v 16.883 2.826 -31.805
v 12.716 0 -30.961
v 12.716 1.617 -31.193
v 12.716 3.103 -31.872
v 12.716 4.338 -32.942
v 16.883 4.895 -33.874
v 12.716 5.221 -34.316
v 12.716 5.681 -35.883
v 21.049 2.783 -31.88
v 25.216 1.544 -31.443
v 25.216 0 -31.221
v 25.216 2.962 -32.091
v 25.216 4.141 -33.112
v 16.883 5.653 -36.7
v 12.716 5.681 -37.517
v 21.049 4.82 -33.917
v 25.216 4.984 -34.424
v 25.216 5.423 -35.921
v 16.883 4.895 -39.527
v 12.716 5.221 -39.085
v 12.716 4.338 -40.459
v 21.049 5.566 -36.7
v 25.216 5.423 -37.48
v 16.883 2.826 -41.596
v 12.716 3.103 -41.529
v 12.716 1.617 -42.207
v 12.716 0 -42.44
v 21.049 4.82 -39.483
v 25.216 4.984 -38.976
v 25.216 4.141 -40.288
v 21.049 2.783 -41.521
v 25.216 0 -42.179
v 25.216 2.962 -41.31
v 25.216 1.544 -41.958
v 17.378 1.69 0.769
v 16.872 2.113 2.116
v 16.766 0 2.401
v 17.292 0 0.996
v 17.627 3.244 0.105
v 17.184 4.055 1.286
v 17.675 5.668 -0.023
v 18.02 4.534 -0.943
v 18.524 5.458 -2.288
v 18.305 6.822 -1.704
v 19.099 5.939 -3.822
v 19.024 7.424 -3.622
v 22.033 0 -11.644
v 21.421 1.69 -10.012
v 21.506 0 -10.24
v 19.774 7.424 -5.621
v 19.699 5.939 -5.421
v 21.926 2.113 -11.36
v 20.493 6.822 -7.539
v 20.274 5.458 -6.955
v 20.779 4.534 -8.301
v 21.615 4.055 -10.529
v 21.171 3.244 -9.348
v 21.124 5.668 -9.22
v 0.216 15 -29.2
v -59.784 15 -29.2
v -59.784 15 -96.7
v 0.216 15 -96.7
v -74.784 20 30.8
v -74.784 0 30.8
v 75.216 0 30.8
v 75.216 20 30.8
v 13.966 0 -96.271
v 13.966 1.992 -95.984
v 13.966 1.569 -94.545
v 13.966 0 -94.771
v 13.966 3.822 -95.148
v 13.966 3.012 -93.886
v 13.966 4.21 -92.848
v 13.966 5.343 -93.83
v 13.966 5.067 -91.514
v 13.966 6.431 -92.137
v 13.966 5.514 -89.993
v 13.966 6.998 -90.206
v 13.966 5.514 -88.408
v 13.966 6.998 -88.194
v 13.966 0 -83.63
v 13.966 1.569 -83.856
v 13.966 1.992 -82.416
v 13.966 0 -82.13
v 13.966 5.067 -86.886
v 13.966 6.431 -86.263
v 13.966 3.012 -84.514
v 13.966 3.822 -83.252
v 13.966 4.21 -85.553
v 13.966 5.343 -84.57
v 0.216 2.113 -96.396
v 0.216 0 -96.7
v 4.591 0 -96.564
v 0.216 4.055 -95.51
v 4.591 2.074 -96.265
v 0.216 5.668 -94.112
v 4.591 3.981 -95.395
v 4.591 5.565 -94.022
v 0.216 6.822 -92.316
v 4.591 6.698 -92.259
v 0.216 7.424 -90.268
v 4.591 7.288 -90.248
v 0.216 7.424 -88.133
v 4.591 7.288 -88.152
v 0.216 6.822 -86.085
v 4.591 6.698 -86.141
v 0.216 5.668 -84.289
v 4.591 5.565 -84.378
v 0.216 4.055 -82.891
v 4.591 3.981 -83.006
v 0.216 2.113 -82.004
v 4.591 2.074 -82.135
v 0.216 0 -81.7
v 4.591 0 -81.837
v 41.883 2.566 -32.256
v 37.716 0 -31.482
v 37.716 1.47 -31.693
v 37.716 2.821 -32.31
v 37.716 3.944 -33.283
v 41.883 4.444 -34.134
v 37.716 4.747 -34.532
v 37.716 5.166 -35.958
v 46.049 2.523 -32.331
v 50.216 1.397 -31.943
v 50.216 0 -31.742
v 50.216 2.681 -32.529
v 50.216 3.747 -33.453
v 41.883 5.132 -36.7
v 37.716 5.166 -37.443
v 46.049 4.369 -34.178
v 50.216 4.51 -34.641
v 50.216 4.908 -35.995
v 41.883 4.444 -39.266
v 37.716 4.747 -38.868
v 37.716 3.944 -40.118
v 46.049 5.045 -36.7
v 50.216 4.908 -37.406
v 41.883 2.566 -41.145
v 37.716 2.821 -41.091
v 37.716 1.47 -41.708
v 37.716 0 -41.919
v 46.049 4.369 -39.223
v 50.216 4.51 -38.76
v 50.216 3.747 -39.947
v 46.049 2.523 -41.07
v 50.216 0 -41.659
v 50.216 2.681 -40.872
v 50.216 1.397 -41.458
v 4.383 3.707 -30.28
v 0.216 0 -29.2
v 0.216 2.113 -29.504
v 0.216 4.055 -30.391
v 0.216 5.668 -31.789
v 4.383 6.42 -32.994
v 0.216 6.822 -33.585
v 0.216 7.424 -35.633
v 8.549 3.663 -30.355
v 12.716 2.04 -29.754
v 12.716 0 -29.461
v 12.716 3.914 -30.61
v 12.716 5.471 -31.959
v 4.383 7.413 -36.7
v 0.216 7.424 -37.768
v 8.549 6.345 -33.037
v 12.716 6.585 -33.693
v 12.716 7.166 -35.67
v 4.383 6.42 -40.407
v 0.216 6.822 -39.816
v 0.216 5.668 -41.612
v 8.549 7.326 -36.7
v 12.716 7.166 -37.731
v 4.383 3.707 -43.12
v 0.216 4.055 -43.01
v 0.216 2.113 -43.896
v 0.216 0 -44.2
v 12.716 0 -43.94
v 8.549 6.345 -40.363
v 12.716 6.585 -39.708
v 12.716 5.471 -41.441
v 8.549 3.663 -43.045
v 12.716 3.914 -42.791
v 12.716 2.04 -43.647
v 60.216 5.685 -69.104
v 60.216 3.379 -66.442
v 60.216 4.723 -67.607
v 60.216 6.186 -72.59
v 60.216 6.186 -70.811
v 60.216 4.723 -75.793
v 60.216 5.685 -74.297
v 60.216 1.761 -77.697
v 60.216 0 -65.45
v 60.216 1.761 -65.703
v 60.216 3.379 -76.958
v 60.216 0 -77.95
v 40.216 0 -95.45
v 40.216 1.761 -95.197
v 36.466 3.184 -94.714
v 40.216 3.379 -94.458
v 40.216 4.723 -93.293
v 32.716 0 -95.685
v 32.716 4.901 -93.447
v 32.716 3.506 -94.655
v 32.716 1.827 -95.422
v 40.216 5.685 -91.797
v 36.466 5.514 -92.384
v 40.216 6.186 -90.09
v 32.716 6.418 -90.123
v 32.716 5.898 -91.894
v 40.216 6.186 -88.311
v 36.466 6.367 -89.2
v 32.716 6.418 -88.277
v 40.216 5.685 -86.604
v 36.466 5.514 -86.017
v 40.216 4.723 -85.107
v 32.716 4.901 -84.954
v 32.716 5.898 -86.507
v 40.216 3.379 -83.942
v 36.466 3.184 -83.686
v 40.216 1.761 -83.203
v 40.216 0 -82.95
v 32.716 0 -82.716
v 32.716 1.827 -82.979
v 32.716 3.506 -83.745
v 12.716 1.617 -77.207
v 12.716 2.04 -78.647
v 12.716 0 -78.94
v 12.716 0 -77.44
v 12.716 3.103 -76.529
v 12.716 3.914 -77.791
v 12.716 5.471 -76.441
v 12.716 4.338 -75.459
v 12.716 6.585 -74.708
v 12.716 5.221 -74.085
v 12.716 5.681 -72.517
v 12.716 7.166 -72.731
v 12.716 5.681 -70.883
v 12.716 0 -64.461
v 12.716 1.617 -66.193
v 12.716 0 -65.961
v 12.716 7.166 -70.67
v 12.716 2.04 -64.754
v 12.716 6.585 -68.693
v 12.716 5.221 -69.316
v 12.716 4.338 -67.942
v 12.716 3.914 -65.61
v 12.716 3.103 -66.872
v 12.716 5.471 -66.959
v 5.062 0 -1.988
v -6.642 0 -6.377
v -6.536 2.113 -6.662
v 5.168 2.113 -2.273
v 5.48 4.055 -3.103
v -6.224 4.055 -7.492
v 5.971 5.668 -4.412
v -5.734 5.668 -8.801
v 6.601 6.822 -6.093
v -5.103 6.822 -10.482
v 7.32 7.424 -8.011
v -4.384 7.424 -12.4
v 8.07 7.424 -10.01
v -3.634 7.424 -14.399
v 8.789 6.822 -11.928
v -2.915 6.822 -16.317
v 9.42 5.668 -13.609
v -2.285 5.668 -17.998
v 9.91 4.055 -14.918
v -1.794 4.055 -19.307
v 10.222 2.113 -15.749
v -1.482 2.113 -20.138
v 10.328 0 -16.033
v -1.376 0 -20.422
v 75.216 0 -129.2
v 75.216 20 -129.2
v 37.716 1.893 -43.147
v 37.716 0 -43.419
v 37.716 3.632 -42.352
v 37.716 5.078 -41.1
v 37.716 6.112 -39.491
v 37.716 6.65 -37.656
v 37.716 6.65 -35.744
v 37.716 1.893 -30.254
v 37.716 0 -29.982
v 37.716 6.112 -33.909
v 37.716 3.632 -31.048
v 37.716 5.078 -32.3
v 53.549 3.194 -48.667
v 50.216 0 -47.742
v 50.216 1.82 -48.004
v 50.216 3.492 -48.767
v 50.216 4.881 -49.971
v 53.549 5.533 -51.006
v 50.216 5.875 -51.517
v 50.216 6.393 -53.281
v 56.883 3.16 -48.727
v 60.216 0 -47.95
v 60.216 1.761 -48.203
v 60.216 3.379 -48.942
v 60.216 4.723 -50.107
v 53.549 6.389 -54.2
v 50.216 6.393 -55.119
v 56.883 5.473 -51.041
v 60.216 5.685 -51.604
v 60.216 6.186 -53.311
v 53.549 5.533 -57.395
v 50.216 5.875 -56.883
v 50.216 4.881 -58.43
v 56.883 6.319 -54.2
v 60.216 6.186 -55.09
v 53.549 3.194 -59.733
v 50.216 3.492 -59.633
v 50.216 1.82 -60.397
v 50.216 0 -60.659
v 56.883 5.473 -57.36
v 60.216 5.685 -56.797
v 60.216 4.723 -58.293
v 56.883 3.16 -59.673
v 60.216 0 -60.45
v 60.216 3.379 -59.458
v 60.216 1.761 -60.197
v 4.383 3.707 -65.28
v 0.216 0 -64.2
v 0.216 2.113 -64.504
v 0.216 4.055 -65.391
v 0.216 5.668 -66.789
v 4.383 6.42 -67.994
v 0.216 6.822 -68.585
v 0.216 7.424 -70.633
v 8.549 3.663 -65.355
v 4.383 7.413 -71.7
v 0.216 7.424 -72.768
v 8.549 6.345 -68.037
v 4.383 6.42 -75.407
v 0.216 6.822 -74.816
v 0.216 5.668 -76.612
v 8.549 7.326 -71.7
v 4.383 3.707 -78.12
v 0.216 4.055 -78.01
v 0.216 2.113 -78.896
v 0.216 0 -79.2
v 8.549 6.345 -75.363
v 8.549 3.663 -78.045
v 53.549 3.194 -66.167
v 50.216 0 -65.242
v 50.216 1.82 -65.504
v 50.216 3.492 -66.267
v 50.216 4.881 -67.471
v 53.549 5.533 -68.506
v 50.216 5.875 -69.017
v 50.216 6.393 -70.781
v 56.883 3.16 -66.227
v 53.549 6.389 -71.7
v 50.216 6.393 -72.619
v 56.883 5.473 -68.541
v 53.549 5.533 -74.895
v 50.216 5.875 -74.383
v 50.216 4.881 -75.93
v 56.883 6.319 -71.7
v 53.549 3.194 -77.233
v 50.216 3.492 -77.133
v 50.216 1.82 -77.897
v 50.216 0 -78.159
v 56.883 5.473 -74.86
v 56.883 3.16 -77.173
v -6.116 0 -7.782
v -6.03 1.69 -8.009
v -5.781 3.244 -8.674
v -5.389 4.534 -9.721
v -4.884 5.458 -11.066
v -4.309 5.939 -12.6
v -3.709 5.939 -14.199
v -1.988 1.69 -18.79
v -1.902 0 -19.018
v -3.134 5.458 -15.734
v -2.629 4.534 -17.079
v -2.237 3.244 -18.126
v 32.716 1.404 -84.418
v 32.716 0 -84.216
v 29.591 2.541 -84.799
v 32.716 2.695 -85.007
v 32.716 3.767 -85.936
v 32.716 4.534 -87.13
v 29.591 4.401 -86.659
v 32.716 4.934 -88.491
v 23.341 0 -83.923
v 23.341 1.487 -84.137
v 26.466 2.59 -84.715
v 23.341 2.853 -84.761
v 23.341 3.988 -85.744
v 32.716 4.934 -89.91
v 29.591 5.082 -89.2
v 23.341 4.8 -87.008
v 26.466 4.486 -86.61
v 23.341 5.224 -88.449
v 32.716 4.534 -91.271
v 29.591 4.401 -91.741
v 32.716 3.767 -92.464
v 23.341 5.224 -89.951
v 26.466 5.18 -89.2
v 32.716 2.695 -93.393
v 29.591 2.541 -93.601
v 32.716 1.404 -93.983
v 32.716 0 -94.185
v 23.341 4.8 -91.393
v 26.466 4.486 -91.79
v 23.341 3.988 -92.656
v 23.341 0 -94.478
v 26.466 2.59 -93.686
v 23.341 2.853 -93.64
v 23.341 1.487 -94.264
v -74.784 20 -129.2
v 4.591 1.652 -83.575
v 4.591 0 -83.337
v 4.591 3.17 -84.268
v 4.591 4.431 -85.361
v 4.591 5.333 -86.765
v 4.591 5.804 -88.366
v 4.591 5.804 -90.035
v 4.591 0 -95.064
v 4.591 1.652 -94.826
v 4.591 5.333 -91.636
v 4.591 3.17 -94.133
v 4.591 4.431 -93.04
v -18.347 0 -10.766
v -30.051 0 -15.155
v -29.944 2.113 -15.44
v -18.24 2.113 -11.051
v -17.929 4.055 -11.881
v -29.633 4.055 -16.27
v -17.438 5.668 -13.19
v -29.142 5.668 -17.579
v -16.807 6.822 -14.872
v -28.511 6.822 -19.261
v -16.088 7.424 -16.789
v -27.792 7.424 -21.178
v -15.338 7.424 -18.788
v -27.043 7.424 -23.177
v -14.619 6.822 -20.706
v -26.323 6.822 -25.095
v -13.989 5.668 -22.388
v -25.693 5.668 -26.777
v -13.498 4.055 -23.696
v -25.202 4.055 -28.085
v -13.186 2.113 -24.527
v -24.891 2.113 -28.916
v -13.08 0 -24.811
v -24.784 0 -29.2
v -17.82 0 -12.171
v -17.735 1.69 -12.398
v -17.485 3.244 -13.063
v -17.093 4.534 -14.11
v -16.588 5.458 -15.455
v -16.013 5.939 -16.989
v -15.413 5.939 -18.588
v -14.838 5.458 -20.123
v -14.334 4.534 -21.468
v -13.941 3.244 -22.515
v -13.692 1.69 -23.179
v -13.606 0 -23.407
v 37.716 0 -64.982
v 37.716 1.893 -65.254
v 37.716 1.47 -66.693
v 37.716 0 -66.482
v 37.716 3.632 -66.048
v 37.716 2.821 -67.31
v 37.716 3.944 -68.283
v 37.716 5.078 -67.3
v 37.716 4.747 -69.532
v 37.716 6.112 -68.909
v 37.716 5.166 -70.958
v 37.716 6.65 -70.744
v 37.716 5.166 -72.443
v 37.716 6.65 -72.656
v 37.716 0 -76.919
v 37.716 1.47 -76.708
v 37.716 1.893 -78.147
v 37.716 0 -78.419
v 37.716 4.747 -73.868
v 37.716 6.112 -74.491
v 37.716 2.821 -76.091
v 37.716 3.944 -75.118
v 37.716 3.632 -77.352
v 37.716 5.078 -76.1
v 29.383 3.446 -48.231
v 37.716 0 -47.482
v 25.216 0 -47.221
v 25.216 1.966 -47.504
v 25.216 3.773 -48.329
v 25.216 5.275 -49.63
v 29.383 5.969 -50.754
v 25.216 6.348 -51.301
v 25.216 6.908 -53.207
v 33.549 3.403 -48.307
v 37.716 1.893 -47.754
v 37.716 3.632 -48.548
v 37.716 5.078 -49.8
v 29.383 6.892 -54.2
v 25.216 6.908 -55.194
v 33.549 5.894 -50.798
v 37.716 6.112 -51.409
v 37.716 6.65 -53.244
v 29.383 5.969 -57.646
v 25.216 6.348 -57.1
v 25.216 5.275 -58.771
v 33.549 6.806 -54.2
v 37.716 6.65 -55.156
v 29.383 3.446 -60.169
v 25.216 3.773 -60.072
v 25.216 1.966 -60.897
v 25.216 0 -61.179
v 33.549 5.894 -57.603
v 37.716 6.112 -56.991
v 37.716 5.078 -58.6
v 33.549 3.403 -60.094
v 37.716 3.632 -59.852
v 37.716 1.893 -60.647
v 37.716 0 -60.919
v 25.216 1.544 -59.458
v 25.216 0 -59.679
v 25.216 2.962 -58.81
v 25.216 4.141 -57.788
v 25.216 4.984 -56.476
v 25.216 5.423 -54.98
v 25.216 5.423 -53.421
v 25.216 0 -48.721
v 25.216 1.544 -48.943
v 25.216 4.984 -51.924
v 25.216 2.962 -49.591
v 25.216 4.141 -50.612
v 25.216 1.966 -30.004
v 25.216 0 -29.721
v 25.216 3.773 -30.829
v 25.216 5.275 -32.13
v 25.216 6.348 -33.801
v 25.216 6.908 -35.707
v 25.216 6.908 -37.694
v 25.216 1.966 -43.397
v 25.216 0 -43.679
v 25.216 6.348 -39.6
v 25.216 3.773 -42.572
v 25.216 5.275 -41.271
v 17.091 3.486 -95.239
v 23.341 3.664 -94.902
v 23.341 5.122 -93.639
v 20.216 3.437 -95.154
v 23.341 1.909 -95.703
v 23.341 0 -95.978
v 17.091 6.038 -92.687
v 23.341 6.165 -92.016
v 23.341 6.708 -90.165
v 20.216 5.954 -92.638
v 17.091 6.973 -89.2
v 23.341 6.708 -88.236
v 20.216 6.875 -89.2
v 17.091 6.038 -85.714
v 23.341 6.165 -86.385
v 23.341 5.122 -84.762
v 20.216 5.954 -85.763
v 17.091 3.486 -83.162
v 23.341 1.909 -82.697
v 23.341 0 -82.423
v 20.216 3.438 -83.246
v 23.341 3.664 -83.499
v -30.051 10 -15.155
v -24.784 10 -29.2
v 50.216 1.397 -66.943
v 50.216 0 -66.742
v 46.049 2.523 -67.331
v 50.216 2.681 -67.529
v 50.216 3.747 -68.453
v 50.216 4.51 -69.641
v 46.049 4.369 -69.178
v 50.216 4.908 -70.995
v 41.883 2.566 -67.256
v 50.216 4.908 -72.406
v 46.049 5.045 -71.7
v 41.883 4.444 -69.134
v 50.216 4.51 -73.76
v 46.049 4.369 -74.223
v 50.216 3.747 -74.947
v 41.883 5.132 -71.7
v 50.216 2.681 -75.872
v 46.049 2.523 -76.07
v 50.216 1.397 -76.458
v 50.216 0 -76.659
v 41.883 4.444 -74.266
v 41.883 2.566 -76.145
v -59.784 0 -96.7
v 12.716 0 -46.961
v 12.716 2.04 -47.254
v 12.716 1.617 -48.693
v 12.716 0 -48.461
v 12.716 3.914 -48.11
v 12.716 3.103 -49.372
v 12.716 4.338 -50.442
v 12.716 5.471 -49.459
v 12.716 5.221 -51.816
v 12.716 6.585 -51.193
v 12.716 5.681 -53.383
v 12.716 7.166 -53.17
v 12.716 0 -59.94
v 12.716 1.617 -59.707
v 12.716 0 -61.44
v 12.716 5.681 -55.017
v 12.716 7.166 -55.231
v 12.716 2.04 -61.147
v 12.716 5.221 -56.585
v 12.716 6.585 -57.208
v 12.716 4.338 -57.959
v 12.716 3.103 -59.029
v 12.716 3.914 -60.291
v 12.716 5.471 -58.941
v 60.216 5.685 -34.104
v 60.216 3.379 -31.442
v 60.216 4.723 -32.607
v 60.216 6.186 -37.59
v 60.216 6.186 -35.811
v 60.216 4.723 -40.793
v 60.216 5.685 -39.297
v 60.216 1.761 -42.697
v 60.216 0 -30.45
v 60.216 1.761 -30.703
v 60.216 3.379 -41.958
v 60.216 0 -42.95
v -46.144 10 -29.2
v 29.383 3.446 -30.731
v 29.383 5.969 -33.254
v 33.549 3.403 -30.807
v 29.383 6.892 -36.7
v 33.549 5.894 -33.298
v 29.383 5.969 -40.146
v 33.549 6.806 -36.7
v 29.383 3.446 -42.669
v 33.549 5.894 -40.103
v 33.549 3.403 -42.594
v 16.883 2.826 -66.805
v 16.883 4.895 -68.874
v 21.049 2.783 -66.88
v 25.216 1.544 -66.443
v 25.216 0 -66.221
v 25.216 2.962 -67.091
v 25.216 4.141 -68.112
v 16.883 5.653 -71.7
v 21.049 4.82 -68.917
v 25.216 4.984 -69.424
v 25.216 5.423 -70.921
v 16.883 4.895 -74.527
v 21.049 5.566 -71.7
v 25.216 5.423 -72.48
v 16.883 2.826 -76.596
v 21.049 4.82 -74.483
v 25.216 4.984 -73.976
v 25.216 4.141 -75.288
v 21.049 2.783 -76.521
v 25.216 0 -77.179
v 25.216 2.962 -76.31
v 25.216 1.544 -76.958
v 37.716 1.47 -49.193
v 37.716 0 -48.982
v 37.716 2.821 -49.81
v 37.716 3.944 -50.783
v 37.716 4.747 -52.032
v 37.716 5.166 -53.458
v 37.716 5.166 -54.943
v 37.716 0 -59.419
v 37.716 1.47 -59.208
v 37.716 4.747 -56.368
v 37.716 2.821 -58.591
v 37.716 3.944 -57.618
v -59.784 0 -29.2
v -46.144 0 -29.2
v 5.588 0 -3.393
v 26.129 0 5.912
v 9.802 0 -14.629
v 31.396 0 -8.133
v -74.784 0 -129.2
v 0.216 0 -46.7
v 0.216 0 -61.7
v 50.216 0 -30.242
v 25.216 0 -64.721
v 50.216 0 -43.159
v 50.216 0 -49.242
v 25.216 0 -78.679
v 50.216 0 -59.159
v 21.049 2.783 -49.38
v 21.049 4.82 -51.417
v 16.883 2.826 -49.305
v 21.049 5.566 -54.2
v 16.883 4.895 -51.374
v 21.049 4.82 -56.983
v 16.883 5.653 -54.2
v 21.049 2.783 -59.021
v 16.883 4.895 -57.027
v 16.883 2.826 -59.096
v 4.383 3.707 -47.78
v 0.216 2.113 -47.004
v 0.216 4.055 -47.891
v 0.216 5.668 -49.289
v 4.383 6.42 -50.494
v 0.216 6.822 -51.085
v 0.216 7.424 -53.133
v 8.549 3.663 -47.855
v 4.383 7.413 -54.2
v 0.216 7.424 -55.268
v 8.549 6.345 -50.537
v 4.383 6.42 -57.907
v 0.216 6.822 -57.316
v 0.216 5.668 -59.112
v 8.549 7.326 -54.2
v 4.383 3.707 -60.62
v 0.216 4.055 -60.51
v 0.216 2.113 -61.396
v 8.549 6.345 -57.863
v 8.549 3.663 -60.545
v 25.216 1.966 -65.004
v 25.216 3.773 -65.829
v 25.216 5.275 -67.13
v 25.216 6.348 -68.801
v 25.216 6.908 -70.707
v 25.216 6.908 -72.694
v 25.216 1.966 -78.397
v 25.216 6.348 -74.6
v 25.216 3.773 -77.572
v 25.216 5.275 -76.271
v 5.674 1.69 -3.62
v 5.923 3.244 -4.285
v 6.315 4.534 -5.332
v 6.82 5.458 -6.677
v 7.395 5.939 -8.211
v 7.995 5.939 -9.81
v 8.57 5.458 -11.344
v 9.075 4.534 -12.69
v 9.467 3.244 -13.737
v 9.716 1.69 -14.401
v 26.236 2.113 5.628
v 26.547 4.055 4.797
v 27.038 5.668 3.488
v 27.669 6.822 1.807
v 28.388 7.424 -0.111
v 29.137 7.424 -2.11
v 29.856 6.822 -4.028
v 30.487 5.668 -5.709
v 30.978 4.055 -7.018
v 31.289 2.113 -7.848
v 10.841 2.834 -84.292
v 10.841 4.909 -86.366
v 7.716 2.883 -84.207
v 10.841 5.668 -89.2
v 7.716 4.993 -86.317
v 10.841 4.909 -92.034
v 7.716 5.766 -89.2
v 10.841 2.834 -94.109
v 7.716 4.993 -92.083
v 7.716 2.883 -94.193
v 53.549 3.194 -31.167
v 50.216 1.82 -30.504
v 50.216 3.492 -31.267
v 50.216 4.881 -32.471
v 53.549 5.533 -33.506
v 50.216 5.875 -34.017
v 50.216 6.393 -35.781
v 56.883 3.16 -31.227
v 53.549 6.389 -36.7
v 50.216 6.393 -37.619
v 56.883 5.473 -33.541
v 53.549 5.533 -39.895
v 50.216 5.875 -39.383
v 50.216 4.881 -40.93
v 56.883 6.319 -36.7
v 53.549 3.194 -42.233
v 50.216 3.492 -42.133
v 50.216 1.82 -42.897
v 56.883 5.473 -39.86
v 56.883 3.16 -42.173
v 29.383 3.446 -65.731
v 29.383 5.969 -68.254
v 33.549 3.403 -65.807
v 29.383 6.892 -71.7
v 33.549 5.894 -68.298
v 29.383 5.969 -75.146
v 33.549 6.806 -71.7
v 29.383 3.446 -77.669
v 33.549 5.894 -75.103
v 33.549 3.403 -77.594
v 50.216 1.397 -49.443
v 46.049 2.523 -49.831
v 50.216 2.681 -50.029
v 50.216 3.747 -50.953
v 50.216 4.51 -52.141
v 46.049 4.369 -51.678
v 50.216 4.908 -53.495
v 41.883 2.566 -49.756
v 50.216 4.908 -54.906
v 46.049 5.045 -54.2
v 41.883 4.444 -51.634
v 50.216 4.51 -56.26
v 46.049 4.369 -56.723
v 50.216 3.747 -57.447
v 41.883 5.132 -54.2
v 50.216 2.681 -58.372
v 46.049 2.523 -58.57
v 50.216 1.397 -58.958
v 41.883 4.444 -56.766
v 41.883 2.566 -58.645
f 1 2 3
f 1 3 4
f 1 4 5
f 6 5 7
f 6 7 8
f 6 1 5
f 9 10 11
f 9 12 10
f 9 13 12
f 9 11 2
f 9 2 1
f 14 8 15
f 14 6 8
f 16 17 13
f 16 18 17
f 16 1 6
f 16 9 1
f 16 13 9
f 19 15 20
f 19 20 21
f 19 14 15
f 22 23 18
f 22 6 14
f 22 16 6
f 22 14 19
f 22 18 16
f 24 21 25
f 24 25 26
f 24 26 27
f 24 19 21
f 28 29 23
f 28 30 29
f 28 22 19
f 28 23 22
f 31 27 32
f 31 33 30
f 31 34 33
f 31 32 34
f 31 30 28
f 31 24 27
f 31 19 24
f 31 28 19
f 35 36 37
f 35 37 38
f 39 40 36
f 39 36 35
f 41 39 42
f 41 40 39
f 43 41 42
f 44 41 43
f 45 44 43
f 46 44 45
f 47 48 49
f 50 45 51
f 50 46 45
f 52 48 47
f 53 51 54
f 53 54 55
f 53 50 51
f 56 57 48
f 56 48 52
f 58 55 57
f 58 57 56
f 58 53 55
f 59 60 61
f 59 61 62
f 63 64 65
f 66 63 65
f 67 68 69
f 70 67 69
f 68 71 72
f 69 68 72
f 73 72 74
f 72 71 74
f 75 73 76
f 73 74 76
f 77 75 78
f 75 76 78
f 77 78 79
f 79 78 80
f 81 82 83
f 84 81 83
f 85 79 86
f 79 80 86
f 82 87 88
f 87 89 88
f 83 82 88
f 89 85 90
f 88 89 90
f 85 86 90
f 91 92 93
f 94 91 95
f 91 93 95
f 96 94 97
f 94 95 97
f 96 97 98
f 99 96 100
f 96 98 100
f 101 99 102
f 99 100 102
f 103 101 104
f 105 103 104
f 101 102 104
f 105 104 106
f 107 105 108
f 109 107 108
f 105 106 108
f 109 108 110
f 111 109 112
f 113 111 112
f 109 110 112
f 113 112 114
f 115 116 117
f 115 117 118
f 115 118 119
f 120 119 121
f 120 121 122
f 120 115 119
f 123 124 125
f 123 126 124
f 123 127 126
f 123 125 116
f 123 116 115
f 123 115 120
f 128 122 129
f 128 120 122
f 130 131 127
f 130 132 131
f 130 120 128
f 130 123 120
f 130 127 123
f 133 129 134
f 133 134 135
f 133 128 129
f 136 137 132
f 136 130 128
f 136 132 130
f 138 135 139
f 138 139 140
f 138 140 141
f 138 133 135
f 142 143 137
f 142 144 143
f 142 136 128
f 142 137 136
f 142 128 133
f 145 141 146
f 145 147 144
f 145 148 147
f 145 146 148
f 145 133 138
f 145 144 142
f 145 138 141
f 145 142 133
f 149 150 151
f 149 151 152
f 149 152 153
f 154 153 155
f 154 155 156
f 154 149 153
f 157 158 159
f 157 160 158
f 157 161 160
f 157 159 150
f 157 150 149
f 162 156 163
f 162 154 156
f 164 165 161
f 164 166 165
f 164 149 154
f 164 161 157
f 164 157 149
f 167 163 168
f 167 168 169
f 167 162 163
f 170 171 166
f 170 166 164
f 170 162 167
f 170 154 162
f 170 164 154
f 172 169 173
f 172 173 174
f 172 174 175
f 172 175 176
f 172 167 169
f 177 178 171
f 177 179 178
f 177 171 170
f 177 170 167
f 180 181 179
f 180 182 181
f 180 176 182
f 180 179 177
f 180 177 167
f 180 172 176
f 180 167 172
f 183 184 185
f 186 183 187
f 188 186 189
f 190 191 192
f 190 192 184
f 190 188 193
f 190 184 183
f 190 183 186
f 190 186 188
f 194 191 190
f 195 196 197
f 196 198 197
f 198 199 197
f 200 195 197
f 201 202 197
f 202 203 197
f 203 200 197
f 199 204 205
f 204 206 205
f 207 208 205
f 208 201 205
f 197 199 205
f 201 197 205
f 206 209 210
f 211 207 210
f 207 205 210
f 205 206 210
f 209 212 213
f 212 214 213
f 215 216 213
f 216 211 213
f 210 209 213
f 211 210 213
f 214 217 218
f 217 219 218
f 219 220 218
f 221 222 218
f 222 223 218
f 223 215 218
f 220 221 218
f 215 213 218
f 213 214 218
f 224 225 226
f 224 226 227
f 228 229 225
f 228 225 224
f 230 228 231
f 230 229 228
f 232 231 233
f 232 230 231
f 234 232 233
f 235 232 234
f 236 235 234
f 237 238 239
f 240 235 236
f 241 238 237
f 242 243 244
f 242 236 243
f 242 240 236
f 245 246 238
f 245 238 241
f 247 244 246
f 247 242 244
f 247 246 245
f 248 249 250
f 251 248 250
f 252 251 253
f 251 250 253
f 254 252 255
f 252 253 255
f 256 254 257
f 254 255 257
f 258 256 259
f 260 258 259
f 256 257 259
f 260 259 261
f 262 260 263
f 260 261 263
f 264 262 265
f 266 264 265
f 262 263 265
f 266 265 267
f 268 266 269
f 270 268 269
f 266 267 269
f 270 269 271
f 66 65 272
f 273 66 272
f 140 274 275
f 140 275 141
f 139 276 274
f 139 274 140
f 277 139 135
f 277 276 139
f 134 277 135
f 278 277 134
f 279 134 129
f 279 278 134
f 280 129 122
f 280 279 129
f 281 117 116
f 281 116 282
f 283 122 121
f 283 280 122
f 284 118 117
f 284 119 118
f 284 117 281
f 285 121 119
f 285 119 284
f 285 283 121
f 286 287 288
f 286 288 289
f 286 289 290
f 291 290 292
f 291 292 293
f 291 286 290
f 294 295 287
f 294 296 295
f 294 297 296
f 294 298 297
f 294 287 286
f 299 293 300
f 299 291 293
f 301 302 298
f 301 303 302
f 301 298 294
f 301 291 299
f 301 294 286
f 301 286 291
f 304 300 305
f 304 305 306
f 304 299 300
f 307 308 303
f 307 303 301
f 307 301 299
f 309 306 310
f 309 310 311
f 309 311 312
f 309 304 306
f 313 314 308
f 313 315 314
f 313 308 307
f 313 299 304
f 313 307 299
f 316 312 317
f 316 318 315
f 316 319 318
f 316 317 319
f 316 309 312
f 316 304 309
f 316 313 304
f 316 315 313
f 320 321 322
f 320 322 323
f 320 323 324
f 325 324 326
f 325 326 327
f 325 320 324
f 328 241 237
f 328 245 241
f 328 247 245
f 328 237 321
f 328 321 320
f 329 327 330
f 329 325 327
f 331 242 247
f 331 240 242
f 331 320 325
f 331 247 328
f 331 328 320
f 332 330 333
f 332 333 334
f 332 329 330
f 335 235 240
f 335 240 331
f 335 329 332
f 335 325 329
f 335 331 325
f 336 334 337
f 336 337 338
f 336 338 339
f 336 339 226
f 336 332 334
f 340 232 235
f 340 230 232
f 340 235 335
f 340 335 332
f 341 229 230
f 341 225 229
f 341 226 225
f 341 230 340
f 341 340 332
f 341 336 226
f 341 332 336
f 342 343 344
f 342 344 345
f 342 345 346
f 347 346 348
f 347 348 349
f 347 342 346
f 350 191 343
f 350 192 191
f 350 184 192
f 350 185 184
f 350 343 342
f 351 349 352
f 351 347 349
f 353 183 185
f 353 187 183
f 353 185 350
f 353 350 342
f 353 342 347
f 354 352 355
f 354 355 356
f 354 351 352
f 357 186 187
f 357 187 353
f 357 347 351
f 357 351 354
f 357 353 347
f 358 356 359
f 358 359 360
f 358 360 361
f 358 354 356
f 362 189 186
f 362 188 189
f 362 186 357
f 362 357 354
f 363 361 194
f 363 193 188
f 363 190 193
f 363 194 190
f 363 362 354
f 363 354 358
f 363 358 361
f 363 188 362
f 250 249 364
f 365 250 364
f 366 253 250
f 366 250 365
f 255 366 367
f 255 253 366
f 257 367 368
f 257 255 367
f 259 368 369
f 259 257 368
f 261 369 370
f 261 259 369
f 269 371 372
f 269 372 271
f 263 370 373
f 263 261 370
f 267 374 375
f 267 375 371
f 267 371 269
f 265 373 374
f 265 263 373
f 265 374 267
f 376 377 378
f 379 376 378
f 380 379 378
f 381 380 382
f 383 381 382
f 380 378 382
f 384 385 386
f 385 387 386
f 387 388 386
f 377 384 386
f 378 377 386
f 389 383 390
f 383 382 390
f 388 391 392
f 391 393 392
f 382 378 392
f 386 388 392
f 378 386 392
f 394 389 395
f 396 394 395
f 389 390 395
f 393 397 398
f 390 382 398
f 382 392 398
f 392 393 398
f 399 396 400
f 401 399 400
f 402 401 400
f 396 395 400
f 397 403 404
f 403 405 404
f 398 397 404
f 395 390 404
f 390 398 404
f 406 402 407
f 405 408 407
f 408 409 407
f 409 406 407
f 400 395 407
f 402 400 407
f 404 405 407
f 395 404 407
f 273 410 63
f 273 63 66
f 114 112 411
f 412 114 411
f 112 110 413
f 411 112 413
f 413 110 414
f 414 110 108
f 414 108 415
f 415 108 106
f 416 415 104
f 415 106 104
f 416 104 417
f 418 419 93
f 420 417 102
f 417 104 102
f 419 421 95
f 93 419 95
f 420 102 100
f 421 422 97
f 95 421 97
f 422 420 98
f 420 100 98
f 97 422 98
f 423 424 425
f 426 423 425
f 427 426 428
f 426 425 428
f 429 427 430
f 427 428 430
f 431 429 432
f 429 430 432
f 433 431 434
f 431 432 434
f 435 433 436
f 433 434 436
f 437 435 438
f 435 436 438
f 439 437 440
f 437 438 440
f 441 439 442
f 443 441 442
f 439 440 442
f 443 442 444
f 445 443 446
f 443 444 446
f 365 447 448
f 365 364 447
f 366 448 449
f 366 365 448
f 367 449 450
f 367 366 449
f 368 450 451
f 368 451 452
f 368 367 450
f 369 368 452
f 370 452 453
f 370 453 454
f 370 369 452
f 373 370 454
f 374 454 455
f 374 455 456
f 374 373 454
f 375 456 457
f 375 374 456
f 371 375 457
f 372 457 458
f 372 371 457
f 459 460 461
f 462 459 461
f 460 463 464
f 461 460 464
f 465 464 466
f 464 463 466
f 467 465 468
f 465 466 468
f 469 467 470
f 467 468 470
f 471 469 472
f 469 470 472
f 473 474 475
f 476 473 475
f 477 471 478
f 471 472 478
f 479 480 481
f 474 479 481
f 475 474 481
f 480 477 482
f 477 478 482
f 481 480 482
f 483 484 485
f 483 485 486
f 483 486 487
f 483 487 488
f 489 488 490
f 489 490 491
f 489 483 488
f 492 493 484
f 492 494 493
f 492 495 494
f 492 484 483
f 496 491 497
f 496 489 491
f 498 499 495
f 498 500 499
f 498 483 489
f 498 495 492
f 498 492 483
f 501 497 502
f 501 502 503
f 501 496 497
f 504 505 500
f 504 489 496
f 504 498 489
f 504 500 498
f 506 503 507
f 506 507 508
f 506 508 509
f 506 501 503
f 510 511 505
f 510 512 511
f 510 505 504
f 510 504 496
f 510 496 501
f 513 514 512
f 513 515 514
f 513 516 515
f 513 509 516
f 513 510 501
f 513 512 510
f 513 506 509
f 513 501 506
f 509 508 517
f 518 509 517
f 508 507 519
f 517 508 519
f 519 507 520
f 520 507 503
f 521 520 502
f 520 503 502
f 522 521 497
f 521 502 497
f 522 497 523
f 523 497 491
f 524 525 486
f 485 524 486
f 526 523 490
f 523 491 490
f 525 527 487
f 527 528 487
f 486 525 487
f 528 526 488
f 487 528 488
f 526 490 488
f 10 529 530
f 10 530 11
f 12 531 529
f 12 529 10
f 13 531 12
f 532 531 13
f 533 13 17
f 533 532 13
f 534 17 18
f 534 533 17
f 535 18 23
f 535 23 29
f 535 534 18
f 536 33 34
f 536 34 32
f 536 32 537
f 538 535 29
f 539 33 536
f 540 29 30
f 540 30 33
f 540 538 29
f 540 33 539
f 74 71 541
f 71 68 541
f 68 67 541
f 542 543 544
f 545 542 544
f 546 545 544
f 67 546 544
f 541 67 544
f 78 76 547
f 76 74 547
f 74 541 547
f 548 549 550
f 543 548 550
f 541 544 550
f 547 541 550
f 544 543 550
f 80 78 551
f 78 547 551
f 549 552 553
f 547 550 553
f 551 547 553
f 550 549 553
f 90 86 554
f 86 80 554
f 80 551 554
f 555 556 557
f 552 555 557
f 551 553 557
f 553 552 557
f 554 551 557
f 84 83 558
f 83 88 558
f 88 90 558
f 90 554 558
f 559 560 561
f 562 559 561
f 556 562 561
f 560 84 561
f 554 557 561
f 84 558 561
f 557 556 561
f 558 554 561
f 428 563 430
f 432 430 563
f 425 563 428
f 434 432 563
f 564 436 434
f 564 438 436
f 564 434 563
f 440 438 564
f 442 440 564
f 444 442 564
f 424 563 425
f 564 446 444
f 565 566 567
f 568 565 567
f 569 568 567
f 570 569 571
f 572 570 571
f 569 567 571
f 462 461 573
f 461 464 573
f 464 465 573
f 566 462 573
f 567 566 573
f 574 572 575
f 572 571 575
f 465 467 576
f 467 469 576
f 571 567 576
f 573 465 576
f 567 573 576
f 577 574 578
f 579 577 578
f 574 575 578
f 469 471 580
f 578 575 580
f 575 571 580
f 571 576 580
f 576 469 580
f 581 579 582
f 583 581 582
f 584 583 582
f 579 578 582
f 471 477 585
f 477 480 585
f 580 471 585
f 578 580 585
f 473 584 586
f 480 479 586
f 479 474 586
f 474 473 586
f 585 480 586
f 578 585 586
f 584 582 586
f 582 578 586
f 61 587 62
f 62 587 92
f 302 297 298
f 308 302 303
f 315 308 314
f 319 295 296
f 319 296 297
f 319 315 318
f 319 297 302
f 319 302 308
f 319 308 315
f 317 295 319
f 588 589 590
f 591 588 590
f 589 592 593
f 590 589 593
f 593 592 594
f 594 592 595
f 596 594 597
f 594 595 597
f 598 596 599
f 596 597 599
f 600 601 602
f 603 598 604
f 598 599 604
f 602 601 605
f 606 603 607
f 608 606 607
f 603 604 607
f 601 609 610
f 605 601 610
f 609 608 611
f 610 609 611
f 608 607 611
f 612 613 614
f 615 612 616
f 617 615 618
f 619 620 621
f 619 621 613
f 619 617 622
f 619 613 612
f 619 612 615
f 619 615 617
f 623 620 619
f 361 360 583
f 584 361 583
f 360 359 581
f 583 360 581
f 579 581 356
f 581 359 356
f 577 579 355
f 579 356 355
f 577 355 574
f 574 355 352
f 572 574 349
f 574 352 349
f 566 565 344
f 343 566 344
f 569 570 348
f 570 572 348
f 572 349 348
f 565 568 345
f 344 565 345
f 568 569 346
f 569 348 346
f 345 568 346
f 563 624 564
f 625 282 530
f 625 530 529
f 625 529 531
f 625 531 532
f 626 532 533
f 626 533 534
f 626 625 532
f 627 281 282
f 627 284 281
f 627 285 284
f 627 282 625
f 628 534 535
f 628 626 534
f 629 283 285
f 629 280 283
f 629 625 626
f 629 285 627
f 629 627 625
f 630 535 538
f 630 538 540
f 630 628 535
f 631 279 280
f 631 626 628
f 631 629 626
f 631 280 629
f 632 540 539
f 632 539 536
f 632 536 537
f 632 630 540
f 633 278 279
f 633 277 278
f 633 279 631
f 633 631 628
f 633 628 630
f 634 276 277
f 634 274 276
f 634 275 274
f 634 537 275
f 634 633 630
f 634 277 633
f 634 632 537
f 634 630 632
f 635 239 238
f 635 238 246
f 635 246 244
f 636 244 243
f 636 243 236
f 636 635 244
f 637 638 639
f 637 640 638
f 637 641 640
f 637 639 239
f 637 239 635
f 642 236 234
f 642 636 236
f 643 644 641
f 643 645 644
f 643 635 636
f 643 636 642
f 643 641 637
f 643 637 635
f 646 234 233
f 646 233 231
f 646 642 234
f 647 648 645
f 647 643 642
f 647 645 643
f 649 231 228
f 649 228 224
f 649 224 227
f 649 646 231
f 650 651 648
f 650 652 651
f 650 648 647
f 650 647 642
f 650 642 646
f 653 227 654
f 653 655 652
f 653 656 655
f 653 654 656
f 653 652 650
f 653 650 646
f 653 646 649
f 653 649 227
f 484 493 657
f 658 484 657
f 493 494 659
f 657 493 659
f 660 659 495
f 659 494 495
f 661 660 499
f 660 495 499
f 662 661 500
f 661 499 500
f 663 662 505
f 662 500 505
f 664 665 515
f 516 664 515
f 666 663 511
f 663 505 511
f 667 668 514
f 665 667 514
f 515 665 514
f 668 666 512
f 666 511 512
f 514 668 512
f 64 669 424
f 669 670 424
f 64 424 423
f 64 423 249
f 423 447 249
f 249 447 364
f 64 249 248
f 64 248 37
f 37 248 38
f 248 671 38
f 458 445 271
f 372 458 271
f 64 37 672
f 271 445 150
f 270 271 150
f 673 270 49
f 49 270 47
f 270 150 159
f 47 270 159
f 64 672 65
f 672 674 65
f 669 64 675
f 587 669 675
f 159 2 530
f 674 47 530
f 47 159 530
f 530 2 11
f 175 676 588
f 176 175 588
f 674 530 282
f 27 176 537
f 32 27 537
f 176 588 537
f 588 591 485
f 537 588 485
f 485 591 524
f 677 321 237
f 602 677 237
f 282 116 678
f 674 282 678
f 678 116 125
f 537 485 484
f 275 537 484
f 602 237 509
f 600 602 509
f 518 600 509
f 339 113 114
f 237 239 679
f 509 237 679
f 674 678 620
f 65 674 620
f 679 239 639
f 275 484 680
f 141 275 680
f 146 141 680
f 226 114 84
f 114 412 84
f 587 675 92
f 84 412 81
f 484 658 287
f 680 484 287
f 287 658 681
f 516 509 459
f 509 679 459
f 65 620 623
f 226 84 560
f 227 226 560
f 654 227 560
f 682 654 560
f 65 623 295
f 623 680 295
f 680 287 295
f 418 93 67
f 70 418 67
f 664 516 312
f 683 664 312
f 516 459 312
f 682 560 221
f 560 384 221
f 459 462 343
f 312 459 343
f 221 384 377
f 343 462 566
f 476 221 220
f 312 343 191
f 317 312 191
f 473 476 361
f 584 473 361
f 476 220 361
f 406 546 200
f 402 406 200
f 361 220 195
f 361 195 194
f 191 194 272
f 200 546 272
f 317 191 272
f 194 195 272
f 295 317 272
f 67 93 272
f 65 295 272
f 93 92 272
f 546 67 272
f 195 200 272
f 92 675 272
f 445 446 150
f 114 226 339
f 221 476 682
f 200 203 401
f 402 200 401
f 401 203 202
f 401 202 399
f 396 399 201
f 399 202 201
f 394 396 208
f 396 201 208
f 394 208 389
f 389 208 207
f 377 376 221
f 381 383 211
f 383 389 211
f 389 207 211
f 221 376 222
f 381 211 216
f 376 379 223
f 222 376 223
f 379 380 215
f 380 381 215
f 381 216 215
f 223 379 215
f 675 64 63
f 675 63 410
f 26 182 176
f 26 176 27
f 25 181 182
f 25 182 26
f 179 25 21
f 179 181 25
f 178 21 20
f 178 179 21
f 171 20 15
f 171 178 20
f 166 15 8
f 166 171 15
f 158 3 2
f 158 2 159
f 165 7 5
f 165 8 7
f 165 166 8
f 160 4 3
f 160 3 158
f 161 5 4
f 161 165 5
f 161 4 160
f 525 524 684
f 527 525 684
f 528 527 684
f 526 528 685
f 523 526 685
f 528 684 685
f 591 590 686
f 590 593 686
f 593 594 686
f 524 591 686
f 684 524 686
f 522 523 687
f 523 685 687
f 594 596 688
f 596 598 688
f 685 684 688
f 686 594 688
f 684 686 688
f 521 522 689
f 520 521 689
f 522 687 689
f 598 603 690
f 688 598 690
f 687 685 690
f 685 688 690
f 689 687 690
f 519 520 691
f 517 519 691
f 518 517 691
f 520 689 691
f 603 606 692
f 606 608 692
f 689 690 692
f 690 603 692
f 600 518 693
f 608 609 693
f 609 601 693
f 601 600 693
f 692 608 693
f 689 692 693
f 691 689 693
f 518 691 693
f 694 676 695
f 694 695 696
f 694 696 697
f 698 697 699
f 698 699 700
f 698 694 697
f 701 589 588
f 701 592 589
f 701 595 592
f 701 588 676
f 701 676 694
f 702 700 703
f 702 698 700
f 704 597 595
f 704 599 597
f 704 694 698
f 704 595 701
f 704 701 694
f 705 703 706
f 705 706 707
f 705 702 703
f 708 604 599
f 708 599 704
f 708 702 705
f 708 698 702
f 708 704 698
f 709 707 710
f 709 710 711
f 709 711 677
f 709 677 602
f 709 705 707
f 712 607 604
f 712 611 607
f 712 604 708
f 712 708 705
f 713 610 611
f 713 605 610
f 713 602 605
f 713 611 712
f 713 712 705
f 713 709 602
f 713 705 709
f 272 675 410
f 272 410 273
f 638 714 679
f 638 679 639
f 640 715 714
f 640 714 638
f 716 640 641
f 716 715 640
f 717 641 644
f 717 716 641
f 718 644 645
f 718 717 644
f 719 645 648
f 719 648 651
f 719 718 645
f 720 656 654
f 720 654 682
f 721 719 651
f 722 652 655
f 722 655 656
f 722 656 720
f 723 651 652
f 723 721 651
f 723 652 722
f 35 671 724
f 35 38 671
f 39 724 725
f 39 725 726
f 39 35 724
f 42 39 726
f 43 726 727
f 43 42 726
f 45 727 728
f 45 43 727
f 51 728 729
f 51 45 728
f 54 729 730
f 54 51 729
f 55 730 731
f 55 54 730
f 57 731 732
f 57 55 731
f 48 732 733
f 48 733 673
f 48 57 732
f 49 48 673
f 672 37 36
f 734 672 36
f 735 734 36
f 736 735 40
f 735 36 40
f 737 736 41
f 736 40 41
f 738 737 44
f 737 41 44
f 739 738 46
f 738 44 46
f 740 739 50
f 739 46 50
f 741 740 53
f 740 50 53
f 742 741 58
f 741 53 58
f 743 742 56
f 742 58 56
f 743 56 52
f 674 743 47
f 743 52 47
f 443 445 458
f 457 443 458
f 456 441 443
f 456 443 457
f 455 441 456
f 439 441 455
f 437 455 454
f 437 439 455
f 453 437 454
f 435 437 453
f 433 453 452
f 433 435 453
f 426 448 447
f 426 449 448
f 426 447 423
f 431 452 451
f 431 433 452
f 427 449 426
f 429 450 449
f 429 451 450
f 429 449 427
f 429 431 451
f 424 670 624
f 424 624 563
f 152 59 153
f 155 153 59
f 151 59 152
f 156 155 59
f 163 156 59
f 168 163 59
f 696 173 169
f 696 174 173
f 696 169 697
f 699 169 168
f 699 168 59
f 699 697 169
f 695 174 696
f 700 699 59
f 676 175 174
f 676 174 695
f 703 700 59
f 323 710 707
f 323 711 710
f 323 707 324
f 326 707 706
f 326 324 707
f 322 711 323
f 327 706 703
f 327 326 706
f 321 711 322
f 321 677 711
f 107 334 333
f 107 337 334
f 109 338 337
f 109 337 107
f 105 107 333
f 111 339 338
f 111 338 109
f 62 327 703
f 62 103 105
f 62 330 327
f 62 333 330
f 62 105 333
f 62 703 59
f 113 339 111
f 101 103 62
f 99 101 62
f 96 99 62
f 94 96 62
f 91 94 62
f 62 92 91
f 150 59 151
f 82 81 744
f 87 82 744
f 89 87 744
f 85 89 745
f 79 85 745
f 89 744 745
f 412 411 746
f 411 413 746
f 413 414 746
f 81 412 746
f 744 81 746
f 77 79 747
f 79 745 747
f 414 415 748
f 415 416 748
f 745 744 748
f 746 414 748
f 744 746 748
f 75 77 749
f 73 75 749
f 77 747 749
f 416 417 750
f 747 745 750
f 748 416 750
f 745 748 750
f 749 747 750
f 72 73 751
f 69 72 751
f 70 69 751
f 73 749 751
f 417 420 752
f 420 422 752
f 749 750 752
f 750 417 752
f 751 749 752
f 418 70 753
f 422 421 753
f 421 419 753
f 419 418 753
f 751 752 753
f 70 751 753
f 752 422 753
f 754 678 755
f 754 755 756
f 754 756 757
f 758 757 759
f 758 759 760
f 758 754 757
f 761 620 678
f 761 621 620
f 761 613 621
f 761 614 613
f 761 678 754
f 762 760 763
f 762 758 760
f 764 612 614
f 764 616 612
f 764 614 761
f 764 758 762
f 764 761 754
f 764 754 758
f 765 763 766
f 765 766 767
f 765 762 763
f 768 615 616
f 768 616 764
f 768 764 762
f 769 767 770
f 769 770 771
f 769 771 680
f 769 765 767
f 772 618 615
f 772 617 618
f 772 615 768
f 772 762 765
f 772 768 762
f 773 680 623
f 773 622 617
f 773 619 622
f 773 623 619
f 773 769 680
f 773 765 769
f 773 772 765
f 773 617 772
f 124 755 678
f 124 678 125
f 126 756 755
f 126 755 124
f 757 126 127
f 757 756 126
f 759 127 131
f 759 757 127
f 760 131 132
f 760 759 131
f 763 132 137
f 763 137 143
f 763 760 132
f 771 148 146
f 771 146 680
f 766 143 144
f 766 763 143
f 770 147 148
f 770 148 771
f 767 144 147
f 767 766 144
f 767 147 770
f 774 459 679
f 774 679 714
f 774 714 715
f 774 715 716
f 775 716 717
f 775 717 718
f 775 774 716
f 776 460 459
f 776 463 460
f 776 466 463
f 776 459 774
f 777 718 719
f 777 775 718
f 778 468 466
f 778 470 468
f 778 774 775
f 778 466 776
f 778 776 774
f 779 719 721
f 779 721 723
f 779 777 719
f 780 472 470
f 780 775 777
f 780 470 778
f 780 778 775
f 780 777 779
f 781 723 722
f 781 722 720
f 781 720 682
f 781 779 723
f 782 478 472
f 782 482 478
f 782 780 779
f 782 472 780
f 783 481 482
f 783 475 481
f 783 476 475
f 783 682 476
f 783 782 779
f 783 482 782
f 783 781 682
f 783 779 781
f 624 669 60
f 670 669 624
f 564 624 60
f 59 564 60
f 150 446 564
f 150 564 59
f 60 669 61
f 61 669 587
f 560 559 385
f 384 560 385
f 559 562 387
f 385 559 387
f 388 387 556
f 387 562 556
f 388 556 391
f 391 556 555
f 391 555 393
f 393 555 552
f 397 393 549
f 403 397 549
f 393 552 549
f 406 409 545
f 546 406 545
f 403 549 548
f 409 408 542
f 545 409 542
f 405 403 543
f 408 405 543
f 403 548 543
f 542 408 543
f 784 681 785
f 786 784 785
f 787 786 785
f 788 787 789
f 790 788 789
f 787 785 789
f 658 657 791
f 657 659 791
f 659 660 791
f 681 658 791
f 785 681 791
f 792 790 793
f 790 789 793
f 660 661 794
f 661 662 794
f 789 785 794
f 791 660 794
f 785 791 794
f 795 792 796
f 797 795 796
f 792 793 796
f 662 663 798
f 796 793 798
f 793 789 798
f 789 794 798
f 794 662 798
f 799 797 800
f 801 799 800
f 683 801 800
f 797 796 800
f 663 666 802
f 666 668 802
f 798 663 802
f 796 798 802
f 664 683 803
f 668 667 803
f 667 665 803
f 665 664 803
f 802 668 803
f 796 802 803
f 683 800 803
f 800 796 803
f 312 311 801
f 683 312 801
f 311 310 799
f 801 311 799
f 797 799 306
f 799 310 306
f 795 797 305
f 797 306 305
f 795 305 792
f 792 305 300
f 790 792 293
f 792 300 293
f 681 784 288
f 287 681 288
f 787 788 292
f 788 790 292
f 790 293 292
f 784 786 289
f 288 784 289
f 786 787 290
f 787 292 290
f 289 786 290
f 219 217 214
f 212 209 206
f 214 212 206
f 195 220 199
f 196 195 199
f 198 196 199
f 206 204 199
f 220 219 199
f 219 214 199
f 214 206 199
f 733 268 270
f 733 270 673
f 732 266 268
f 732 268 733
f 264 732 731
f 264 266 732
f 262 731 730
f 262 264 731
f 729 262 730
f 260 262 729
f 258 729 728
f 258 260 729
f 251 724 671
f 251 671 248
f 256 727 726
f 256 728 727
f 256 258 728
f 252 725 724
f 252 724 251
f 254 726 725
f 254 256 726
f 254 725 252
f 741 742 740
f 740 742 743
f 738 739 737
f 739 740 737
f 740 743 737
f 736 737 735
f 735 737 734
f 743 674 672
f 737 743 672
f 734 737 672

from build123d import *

# Parameters (mm, degrees)
SKETCH1_W               = 150
SKETCH1_H               = 160
BOSS_EXTRUDE1_DEPTH     = 20
CUT_EXTRUDE1_DEPTH      = 15
CUT_EXTRUDE1_DEPTH_BACK = 15
SKETCH2_W               = 60
SKETCH2_H               = 67.5
CUT_EXTRUDE6_DEPTH      = 10
CUT_EXTRUDE6_DEPTH_BACK = 0.1
REVOLVE2_ANGLE          = 180
REVOLVE3_ANGLE          = 180
REVOLVE4_ANGLE          = 180
REVOLVE5_ANGLE          = 180
REVOLVE6_ANGLE          = 180
REVOLVE7_ANGLE          = 180
REVOLVE8_ANGLE          = 180
REVOLVE9_ANGLE          = 180
REVOLVE10_ANGLE         = 180
REVOLVE11_ANGLE         = 180


with BuildPart() as part:
    # Sketch1 → Boss-Extrude1 (new body)
    with BuildSketch(Plane(origin=(0, 0, 0), x_dir=(1, 0, 0), z_dir=(0, 1, 0))):
        with Locations((0.216138329, 49.200288184)):
            Rectangle(SKETCH1_W, SKETCH1_H)
    extrude(amount=BOSS_EXTRUDE1_DEPTH)

    # Sketch2 → Cut-Extrude1 (cut, two sides: drawn at the far end of the back side and taken through both)
    with BuildSketch(Plane(origin=(0, 0, 0), x_dir=(1, 0, 0), z_dir=(0, 1, 0)).offset(-CUT_EXTRUDE1_DEPTH_BACK)):
        with Locations((-29.783861671, 62.950288184)):
            Rectangle(SKETCH2_W, SKETCH2_H)
    extrude(amount=CUT_EXTRUDE1_DEPTH + CUT_EXTRUDE1_DEPTH_BACK, mode=Mode.SUBTRACT)

    # Sketch3 → Cut-Revolve1 (revolve, cut)
    with BuildSketch(Plane(origin=(0, 0, 0), x_dir=(1, 0, 0), z_dir=(0, 1, 0))):
        Polygon((0.216138329, 96.700288184), (40.216138329, 95.450288184), (40.216138329, 89.200288184), (0.216138329, 89.200288184), align=None)
    revolve(axis=Axis((0.216138329, 0, -89.200288184), (1, 0, 0)), mode=Mode.SUBTRACT)

    # Sketch4 → Cut-Revolve2 (revolve, cut)
    with BuildSketch(Plane(origin=(0, 0, 0), x_dir=(1, 0, 0), z_dir=(0, 1, 0))):
        Polygon((0.216138329, 79.200288184), (60.216138329, 77.950288184), (60.216138329, 71.700288184), (0.216138329, 71.700288184), align=None)
    revolve(axis=Axis((94.987400497, 0, -71.700288184), (-1, 0, 0)), mode=Mode.SUBTRACT)

    # Sketch6 → Cut-Revolve3 (revolve, cut)
    with BuildSketch(Plane(origin=(0, 0, 0), x_dir=(1, 0, 0), z_dir=(0, 1, 0))):
        Polygon((0.216138329, 61.700288184), (60.216138329, 60.450288184), (60.216138329, 54.200288184), (0.216138329, 54.200288184), align=None)
    revolve(axis=Axis((60.216138329, 0, -54.200288184), (-1, 0, 0)), mode=Mode.SUBTRACT)

    # Sketch7 → Cut-Revolve4 (revolve, cut)
    with BuildSketch(Plane(origin=(0, 0, 0), x_dir=(1, 0, 0), z_dir=(0, 1, 0))):
        Polygon((0.216138329, 44.200288184), (60.216138329, 42.950288184), (60.216138329, 36.700288184), (0.216138329, 36.700288184), align=None)
    revolve(axis=Axis((60.216138329, 0, -36.700288184), (-1, 0, 0)), mode=Mode.SUBTRACT)

    # Sketch11 → Cut-Revolve5 (revolve, cut)
    with BuildSketch(Plane(origin=(0, 0, 0), x_dir=(1, 0, 0), z_dir=(0, 1, 0))):
        Polygon((-46.143861671, 29.200288184), (28.762467917, 1.110400544), (31.395894883, 8.132868943), (-24.783861671, 29.200288184), align=None)
    revolve(axis=Axis((28.762467917, 0, -1.110400544), (-0.9363291198500703, 0, -0.35112359550561795)), mode=Mode.SUBTRACT)

    # Sketch13 → Cut-Extrude6 (cut, two sides: drawn at the far end of the back side and taken through both)
    with BuildSketch(Plane(origin=(0, 0, 0), x_dir=(1, 0, 0), z_dir=(0, 1, 0)).offset(-CUT_EXTRUDE6_DEPTH_BACK)):
        Polygon((-30.050715604, 15.155351387), (-24.783861671, 29.200288184), (-46.143861671, 29.200288184), align=None)
    extrude(amount=CUT_EXTRUDE6_DEPTH + CUT_EXTRUDE6_DEPTH_BACK, mode=Mode.SUBTRACT)

    # Sketch15 → Revolve2 (revolve)
    with BuildSketch(Plane(origin=(0, 0, 0), x_dir=(1, 0, 0), z_dir=(0, 1, 0))):
        Polygon((50.216138329, 30.241954851), (37.716138329, 29.981538184), (37.716138329, 31.481538184), (50.216138329, 31.741954851), align=None)
    revolve(axis=Axis((60.216138329, 0, -36.700288184), (-1, 0, 0)), revolution_arc=REVOLVE2_ANGLE)

    # Sketch16 → Revolve3 (revolve)
    with BuildSketch(Plane(origin=(0, 0, 0), x_dir=(1, 0, 0), z_dir=(0, 1, 0))):
        Polygon((25.216138329, 29.721121518), (12.716138329, 29.460704851), (12.716138329, 30.960704851), (25.216138329, 31.221121518), align=None)
    revolve(axis=Axis((60.216138329, 0, -36.700288184), (-1, 0, 0)), revolution_arc=REVOLVE3_ANGLE)

    # Sketch17 → Revolve4 (revolve)
    with BuildSketch(Plane(origin=(0, 0, 0), x_dir=(1, 0, 0), z_dir=(0, 1, 0))):
        Polygon((50.216138329, 47.741954851), (50.216138329, 49.241954851), (37.716138329, 48.981538184), (37.716138329, 47.481538184), align=None)
    revolve(axis=Axis((60.216138329, 0, -54.200288184), (-1, 0, 0)), revolution_arc=REVOLVE4_ANGLE)

    # Sketch18 → Revolve5 (revolve)
    with BuildSketch(Plane(origin=(0, 0, 0), x_dir=(1, 0, 0), z_dir=(0, 1, 0))):
        Polygon((25.216138329, 47.221121518), (25.216138329, 48.721121518), (12.716138329, 48.460704851), (12.716138329, 46.960704851), align=None)
    revolve(axis=Axis((60.216138329, 0, -54.200288184), (-1, 0, 0)), revolution_arc=REVOLVE5_ANGLE)

    # Sketch19 → Revolve6 (revolve)
    with BuildSketch(Plane(origin=(0, 0, 0), x_dir=(1, 0, 0), z_dir=(0, 1, 0))):
        Polygon((50.216138329, 65.241954851), (50.216138329, 66.741954851), (37.716138329, 66.481538184), (37.716138329, 64.981538184), align=None)
    revolve(axis=Axis((60.216138329, 0, -71.700288184), (-1, 0, 0)), revolution_arc=REVOLVE6_ANGLE)

    # Sketch20 → Revolve7 (revolve)
    with BuildSketch(Plane(origin=(0, 0, 0), x_dir=(1, 0, 0), z_dir=(0, 1, 0))):
        Polygon((25.216138329, 66.221121518), (25.216138329, 64.721121518), (12.716138329, 64.460704851), (12.716138329, 65.960704851), align=None)
    revolve(axis=Axis((60.216138329, 0, -71.700288184), (-1, 0, 0)), revolution_arc=REVOLVE7_ANGLE)

    # Sketch21 → Revolve8 (revolve)
    with BuildSketch(Plane(origin=(0, 0, 0), x_dir=(1, 0, 0), z_dir=(0, 1, 0))):
        Polygon((32.716138329, 82.715913184), (32.716138329, 84.215913184), (23.341138329, 83.922944434), (23.341138329, 82.422944434), align=None)
    revolve(axis=Axis((40.216138329, 0, -89.200288184), (-1, 0, 0)), revolution_arc=REVOLVE8_ANGLE)

    # Sketch22 → Revolve9 (revolve)
    with BuildSketch(Plane(origin=(0, 0, 0), x_dir=(1, 0, 0), z_dir=(0, 1, 0))):
        Polygon((13.966138329, 82.129975684), (13.966138329, 83.629975684), (4.591138329, 83.337006934), (4.591138329, 81.837006934), align=None)
    revolve(axis=Axis((40.216138329, 0, -89.200288184), (-1, 0, 0)), revolution_arc=REVOLVE9_ANGLE)

    # Sketch23 → Revolve10 (revolve)
    with BuildSketch(Plane(origin=(0, 0, 0), x_dir=(1, 0, 0), z_dir=(0, 1, 0))):
        Polygon((17.292435145, -0.99633822), (16.765749752, -2.4008319), (5.061635754, 1.988213044), (5.588321147, 3.392706724), align=None)
    revolve(axis=Axis((28.762467917, 0, -1.110400544), (-0.9363291198500702, 0, -0.35112359550561806)), revolution_arc=REVOLVE10_ANGLE)

    # Sketch25 → Revolve11 (revolve)
    with BuildSketch(Plane(origin=(0, 0, 0), x_dir=(1, 0, 0), z_dir=(0, 1, 0))):
        Polygon((-6.115792851, 7.781751668), (-6.642478245, 6.377257988), (-18.346592243, 10.766302932), (-17.819906849, 12.170796611), align=None)
    revolve(axis=Axis((28.762467917, 0, -1.110400544), (-0.9363291198500703, 0, -0.351123595505618)), revolution_arc=REVOLVE11_ANGLE)


solid = part.part
